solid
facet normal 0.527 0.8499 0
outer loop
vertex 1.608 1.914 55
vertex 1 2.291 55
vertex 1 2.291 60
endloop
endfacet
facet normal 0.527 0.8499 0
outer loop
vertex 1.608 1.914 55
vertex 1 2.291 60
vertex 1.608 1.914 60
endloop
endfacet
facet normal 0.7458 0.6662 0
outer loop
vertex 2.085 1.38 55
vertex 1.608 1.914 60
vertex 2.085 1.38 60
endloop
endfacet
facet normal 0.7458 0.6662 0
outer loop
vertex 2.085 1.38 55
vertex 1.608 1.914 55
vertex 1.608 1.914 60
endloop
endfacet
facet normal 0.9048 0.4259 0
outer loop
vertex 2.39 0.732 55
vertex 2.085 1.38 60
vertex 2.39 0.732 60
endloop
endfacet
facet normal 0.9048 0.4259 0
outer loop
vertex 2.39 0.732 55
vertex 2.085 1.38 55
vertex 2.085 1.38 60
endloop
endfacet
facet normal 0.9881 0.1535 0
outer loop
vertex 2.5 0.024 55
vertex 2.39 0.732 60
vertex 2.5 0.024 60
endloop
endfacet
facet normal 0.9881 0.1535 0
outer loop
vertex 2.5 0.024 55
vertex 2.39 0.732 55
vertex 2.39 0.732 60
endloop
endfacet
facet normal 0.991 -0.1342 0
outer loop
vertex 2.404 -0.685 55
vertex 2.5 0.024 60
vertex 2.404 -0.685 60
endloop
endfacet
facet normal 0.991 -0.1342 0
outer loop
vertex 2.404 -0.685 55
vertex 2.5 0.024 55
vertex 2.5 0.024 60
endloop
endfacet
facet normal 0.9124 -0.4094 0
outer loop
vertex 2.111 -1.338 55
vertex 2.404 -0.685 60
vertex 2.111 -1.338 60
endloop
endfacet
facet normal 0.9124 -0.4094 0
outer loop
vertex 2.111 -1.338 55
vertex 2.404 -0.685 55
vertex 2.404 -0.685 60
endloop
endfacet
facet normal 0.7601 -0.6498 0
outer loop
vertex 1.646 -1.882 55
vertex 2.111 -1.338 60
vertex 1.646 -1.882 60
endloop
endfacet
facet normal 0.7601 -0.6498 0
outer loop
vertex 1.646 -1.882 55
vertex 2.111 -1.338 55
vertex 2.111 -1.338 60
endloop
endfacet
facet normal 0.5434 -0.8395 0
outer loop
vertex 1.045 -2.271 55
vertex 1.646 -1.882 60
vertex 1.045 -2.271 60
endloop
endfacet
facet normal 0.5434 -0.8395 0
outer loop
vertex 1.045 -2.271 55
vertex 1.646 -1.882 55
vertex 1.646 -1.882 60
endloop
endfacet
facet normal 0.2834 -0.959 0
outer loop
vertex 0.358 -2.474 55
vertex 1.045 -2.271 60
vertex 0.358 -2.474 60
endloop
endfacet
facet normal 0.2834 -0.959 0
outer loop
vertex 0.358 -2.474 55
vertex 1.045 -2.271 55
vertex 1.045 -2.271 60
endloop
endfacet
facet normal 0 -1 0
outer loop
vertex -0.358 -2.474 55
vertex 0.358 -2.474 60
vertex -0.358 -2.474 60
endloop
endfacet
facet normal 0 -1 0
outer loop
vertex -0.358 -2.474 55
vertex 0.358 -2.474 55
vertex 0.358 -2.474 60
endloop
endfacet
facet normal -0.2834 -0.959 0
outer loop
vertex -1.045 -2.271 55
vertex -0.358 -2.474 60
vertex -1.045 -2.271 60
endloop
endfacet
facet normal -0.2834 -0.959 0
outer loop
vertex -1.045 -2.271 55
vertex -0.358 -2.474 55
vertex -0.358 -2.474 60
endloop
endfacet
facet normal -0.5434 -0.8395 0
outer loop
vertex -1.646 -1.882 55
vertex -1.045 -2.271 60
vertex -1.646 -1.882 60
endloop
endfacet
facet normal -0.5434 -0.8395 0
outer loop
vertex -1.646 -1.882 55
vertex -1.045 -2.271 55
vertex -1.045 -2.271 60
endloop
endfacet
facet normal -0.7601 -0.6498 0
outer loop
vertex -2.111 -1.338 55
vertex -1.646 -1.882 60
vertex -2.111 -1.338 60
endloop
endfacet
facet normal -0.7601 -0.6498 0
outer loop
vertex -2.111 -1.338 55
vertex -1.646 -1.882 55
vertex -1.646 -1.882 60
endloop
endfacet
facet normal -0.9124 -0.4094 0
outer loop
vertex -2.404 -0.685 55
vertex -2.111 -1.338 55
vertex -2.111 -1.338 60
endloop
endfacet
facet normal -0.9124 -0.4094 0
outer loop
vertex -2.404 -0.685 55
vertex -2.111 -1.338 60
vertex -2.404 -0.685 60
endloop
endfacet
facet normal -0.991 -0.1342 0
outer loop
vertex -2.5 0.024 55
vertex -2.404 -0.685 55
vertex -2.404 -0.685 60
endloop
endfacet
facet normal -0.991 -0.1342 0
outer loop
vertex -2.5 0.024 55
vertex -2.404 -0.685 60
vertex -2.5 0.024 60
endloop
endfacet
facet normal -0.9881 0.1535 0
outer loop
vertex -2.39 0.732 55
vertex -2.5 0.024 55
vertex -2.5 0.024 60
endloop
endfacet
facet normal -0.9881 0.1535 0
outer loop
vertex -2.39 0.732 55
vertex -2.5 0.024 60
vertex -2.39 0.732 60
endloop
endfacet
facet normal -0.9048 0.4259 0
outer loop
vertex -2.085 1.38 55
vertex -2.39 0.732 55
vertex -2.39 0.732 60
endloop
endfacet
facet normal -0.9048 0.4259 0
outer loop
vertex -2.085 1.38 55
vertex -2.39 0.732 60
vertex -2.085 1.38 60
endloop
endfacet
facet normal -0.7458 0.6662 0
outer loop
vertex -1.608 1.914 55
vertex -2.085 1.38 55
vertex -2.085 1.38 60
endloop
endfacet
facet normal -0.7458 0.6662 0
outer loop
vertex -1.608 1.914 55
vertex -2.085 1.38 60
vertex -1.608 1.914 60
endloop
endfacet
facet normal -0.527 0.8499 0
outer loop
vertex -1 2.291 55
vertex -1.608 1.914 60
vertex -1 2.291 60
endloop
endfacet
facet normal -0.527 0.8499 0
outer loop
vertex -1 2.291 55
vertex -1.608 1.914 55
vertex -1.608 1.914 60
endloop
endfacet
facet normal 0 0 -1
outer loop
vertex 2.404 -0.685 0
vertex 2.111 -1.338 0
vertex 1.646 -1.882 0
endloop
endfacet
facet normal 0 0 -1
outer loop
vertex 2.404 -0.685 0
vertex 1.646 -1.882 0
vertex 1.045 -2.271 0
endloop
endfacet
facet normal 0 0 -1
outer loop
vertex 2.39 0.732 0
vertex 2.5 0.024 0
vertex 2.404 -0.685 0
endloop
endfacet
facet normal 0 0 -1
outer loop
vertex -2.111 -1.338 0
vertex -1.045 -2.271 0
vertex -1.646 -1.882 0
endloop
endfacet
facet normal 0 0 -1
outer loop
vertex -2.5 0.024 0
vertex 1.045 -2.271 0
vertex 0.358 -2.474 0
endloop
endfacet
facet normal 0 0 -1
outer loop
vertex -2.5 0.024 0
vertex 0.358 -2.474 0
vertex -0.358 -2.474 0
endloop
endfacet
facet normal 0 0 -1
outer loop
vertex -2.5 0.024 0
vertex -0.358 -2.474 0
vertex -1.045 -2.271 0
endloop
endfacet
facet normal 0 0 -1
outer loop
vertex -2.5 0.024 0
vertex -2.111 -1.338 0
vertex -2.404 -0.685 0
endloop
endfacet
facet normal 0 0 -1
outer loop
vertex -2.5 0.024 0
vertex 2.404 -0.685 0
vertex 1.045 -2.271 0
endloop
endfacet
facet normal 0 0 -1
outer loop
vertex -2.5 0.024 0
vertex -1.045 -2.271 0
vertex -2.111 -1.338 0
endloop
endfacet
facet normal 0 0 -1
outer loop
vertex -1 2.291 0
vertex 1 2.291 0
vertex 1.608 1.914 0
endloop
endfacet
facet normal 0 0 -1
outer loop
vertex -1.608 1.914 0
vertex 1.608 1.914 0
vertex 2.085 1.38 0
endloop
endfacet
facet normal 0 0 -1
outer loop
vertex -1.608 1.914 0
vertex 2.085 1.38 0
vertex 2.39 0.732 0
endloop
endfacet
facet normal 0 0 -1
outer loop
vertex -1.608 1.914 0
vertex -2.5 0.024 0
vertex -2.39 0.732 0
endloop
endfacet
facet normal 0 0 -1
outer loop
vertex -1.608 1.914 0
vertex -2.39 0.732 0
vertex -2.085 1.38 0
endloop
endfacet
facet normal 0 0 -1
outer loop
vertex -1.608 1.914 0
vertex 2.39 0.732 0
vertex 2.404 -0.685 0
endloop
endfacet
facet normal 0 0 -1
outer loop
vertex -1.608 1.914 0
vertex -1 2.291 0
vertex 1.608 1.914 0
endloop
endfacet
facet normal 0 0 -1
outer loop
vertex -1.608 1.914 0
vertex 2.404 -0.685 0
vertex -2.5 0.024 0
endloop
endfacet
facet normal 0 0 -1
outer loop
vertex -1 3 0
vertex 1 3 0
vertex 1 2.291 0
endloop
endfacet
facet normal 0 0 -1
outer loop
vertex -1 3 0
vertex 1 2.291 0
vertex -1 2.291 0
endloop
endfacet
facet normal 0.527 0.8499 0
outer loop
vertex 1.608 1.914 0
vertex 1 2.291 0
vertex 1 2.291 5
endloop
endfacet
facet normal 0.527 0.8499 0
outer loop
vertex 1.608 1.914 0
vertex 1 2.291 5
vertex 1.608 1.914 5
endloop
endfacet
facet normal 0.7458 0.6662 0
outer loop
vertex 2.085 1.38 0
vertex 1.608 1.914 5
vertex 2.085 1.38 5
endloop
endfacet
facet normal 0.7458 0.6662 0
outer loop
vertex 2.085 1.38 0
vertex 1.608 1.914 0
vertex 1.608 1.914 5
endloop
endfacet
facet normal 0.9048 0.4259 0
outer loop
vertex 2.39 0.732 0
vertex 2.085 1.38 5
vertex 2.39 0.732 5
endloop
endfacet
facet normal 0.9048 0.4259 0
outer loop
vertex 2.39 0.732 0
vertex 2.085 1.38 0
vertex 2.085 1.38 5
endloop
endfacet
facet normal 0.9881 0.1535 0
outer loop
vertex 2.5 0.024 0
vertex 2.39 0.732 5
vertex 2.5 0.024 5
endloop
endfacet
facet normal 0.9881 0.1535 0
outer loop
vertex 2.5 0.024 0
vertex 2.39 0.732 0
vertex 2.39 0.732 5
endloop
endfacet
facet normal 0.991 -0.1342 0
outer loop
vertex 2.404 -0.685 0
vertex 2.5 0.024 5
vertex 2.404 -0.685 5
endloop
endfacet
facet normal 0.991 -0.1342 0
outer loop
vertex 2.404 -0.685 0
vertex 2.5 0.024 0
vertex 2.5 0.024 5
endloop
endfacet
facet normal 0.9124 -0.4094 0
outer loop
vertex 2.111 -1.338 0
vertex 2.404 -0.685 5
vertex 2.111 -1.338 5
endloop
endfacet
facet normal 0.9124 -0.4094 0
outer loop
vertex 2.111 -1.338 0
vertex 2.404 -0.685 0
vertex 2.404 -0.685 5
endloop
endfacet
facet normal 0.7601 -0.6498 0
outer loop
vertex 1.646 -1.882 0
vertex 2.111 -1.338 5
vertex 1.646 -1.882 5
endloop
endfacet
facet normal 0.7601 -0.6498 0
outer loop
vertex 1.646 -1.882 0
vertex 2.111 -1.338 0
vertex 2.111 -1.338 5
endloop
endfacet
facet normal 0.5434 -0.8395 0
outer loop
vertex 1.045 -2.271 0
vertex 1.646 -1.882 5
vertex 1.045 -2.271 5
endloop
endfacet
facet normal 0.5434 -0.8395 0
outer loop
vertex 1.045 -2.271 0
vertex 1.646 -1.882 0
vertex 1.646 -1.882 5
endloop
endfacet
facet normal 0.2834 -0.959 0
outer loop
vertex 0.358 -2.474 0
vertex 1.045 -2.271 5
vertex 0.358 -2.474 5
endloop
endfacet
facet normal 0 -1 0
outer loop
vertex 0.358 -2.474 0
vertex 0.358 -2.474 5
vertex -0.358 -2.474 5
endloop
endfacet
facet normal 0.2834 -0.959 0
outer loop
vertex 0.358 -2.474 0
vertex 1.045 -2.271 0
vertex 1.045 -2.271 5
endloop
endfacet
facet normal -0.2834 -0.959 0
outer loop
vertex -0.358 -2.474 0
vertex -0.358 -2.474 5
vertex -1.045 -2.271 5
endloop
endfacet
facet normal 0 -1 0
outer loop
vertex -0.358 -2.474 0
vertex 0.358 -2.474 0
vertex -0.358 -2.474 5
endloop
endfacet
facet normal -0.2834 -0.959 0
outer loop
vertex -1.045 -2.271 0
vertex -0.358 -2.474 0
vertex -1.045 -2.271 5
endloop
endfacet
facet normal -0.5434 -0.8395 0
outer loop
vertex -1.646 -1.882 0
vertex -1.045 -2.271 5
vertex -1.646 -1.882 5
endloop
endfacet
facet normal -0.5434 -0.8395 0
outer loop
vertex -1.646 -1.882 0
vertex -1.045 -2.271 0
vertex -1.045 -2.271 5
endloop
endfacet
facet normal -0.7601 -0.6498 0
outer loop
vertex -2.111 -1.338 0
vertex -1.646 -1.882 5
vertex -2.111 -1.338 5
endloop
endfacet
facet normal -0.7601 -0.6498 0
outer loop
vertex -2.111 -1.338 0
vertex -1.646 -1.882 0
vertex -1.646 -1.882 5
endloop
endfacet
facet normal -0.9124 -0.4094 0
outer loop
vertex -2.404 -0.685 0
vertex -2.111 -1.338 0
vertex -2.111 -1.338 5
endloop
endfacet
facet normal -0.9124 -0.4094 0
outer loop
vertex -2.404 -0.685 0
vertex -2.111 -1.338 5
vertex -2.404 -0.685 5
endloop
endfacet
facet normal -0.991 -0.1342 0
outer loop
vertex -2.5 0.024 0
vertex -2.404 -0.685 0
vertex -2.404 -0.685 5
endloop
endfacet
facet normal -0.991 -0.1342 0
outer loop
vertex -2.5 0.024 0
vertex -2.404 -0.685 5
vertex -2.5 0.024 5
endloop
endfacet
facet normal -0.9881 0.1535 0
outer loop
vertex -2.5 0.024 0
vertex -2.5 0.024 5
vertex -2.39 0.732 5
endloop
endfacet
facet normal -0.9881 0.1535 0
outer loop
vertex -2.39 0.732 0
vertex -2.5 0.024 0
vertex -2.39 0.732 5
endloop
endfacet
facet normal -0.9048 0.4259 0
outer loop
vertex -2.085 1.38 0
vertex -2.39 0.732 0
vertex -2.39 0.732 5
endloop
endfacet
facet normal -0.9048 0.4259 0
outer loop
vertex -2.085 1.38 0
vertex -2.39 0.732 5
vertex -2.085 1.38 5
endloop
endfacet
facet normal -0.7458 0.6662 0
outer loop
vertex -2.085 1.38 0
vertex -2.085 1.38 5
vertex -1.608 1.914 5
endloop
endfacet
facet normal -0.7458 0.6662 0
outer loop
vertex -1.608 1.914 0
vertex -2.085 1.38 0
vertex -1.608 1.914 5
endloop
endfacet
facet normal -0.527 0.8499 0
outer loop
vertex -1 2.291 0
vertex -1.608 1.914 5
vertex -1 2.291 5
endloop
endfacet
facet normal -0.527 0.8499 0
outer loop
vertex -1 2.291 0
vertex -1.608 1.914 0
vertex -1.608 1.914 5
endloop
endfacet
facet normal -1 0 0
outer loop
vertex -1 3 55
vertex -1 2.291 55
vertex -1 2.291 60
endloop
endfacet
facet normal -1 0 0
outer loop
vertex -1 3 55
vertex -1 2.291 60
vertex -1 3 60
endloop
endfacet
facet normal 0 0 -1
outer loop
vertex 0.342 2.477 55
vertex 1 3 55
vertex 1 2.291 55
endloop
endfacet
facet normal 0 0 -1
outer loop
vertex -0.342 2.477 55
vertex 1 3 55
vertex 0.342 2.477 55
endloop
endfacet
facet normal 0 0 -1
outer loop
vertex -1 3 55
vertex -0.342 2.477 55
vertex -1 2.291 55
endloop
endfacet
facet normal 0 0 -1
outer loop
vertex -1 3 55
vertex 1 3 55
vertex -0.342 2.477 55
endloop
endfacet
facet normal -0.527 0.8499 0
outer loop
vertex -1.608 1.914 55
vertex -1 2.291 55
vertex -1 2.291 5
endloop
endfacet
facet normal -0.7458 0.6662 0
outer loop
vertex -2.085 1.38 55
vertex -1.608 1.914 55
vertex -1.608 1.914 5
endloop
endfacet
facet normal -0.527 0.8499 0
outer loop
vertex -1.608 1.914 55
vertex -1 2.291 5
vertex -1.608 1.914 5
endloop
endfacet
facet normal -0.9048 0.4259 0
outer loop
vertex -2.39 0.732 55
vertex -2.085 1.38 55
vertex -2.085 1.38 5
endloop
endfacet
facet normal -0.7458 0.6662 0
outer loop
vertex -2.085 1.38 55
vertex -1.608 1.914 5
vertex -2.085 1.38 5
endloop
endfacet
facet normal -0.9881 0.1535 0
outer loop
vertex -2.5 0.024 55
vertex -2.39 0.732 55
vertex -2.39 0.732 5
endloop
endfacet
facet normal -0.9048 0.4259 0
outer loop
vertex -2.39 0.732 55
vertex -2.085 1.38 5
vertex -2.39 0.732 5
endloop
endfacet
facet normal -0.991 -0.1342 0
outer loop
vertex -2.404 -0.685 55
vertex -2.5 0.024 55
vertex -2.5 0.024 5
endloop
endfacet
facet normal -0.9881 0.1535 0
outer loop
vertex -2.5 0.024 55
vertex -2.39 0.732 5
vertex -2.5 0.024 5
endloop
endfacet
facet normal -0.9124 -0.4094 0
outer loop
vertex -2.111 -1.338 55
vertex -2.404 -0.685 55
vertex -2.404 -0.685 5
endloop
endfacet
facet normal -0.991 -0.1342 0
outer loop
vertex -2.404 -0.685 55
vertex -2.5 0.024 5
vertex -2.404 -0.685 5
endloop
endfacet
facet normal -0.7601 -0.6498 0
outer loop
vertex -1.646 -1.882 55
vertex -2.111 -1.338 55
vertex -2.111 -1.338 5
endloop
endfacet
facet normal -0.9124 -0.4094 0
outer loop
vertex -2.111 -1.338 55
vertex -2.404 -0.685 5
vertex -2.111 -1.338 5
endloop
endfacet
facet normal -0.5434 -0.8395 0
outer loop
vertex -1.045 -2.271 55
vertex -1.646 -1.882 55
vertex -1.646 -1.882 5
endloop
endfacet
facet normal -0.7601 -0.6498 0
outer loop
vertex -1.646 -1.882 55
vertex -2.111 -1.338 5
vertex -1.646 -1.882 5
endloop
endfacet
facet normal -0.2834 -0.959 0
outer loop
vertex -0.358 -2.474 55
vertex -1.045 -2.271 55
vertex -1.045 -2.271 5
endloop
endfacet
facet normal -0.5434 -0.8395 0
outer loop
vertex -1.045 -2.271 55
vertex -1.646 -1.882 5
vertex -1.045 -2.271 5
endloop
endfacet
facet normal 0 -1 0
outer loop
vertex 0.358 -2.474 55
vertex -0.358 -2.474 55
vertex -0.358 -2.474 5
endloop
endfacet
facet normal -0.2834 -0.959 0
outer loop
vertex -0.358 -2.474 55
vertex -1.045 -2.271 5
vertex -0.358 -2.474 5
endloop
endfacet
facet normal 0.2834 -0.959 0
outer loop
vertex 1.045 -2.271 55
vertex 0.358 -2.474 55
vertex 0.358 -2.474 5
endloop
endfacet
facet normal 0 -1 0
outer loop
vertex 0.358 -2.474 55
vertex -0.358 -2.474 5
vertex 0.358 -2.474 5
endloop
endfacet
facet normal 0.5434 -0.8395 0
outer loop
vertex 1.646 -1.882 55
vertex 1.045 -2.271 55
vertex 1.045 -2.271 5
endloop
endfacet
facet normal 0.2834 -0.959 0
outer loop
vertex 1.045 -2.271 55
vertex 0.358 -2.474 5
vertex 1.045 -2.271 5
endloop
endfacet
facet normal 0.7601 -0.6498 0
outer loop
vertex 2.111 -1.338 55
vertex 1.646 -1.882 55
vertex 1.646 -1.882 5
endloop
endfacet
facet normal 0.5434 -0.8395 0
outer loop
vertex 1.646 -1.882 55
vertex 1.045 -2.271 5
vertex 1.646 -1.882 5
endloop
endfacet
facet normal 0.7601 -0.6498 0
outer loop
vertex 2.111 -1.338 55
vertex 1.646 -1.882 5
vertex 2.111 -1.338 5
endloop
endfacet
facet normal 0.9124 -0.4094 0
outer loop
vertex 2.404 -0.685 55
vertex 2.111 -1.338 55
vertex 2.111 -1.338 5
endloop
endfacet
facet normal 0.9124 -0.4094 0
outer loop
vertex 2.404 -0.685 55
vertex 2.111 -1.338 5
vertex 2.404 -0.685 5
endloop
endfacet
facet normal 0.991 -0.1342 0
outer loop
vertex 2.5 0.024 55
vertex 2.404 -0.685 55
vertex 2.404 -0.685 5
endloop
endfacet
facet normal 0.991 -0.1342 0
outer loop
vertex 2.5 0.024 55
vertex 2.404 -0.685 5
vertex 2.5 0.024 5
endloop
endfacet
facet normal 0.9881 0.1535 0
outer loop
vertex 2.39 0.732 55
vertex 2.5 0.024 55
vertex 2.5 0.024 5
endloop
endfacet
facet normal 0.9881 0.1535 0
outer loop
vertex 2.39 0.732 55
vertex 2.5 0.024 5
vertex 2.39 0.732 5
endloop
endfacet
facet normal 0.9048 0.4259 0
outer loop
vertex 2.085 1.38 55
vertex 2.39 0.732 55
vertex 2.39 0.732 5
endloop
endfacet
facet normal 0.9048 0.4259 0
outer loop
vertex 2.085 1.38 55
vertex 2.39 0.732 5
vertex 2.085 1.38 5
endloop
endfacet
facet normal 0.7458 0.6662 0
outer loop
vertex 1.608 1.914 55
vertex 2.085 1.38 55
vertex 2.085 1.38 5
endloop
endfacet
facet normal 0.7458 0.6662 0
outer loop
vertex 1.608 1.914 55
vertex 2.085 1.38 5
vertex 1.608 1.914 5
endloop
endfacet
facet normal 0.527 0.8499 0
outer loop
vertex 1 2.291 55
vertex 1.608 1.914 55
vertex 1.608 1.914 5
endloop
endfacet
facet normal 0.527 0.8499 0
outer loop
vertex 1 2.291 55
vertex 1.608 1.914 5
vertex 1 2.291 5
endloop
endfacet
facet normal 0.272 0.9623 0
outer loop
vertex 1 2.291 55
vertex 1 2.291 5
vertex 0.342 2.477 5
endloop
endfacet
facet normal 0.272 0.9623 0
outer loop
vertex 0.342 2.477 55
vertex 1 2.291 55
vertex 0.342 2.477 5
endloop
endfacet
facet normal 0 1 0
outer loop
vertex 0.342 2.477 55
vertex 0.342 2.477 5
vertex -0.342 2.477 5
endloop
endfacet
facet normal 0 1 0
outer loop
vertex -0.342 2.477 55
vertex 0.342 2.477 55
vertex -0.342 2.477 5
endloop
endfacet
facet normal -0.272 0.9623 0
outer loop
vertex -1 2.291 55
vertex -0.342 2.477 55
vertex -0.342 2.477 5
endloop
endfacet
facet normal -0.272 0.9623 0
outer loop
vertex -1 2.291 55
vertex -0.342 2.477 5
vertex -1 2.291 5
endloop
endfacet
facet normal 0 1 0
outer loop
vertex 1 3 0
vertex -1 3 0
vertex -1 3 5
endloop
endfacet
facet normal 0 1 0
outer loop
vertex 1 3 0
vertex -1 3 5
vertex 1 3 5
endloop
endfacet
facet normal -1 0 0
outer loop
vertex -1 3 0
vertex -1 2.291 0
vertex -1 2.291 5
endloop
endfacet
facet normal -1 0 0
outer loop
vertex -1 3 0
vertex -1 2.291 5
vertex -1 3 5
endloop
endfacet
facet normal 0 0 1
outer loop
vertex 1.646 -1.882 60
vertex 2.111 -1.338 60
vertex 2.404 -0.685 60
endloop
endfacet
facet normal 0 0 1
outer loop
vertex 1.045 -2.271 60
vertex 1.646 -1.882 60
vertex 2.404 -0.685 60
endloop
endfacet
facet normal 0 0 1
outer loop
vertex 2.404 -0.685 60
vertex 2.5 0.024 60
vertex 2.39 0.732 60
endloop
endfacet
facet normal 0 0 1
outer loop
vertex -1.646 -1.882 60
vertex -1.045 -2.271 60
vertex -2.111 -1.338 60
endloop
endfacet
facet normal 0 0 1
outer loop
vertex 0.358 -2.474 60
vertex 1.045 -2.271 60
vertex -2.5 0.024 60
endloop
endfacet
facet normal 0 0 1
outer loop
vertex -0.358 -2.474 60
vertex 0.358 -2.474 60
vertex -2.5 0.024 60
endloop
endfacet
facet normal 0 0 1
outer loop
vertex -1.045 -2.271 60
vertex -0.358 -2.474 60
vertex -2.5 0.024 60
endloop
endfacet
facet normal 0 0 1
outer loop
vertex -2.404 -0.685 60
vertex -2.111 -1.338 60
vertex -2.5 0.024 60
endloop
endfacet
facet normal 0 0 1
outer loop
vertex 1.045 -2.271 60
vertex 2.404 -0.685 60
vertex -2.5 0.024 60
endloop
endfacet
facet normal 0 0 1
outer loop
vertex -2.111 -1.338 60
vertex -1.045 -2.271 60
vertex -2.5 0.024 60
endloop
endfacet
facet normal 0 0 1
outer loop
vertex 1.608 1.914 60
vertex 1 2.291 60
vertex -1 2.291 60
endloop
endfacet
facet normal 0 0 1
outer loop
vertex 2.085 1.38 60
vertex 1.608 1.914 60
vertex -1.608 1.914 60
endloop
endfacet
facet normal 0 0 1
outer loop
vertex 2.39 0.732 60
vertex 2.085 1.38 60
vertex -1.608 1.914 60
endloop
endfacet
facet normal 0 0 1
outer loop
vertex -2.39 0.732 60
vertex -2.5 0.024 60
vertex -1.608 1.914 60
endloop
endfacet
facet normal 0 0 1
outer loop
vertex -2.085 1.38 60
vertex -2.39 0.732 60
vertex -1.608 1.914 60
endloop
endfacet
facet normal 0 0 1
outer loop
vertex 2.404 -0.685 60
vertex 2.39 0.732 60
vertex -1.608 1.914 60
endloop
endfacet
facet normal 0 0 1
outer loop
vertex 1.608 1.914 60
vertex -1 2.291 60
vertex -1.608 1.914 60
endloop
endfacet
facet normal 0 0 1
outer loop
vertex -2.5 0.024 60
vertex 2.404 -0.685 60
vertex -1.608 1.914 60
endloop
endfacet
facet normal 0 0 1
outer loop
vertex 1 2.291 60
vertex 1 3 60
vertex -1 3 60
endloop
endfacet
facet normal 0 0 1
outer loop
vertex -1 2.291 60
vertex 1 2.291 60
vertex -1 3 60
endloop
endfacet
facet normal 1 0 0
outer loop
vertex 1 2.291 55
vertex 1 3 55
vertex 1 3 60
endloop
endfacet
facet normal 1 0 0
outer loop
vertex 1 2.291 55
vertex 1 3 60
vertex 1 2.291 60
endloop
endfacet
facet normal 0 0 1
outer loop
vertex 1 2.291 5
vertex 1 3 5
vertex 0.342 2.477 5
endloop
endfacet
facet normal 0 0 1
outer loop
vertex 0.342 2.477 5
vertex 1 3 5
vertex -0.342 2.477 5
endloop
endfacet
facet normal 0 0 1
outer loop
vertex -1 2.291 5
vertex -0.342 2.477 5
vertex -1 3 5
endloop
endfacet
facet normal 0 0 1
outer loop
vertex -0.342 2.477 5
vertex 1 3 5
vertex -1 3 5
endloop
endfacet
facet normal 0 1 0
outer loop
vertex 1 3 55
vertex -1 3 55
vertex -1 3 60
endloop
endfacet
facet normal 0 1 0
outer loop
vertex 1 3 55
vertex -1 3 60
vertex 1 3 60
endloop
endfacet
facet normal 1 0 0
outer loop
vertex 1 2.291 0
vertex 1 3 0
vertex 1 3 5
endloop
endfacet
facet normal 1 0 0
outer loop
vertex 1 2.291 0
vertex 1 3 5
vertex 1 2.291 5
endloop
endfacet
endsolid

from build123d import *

# Parameters (mm, degrees)
EXTRUDE_1_DEPTH = 5
SKETCH_2_R      = 2.5
EXTRUDE_2_DEPTH = 50
EXTRUDE_3_DEPTH = 5


with BuildPart() as part:
    # 草图1 → 凸台-拉伸1 (new body)
    with BuildSketch(Plane.XY):
        with BuildLine():
            Line((-1, 3), (1, 3))
            Line((1, 3), (1, 2.291287847))
            ThreePointArc((1, 2.291287847), (0, -2.5), (-1, 2.291287847))
            Line((-1, 2.291287847), (-1, 3))
        make_face()
    extrude(amount=EXTRUDE_1_DEPTH)

    # 草图2 → 凸台-拉伸2 (add)
    with BuildSketch(Plane.XY.offset(5)):
        with Locations(Location((0, 0, 0), (0, 0, 113.578178478))):
            Circle(SKETCH_2_R)
    extrude(amount=EXTRUDE_2_DEPTH)

    # 草图3 → 凸台-拉伸3 (add)
    with BuildSketch(Plane.XY.offset(55)):
        with BuildLine():
            Line((-1, 3), (1, 3))
            Line((1, 3), (1, 2.291287847))
            ThreePointArc((1, 2.291287847), (0, -2.5), (-1, 2.291287847))
            Line((-1, 2.291287847), (-1, 3))
        make_face()
    extrude(amount=EXTRUDE_3_DEPTH)


solid = part.part
